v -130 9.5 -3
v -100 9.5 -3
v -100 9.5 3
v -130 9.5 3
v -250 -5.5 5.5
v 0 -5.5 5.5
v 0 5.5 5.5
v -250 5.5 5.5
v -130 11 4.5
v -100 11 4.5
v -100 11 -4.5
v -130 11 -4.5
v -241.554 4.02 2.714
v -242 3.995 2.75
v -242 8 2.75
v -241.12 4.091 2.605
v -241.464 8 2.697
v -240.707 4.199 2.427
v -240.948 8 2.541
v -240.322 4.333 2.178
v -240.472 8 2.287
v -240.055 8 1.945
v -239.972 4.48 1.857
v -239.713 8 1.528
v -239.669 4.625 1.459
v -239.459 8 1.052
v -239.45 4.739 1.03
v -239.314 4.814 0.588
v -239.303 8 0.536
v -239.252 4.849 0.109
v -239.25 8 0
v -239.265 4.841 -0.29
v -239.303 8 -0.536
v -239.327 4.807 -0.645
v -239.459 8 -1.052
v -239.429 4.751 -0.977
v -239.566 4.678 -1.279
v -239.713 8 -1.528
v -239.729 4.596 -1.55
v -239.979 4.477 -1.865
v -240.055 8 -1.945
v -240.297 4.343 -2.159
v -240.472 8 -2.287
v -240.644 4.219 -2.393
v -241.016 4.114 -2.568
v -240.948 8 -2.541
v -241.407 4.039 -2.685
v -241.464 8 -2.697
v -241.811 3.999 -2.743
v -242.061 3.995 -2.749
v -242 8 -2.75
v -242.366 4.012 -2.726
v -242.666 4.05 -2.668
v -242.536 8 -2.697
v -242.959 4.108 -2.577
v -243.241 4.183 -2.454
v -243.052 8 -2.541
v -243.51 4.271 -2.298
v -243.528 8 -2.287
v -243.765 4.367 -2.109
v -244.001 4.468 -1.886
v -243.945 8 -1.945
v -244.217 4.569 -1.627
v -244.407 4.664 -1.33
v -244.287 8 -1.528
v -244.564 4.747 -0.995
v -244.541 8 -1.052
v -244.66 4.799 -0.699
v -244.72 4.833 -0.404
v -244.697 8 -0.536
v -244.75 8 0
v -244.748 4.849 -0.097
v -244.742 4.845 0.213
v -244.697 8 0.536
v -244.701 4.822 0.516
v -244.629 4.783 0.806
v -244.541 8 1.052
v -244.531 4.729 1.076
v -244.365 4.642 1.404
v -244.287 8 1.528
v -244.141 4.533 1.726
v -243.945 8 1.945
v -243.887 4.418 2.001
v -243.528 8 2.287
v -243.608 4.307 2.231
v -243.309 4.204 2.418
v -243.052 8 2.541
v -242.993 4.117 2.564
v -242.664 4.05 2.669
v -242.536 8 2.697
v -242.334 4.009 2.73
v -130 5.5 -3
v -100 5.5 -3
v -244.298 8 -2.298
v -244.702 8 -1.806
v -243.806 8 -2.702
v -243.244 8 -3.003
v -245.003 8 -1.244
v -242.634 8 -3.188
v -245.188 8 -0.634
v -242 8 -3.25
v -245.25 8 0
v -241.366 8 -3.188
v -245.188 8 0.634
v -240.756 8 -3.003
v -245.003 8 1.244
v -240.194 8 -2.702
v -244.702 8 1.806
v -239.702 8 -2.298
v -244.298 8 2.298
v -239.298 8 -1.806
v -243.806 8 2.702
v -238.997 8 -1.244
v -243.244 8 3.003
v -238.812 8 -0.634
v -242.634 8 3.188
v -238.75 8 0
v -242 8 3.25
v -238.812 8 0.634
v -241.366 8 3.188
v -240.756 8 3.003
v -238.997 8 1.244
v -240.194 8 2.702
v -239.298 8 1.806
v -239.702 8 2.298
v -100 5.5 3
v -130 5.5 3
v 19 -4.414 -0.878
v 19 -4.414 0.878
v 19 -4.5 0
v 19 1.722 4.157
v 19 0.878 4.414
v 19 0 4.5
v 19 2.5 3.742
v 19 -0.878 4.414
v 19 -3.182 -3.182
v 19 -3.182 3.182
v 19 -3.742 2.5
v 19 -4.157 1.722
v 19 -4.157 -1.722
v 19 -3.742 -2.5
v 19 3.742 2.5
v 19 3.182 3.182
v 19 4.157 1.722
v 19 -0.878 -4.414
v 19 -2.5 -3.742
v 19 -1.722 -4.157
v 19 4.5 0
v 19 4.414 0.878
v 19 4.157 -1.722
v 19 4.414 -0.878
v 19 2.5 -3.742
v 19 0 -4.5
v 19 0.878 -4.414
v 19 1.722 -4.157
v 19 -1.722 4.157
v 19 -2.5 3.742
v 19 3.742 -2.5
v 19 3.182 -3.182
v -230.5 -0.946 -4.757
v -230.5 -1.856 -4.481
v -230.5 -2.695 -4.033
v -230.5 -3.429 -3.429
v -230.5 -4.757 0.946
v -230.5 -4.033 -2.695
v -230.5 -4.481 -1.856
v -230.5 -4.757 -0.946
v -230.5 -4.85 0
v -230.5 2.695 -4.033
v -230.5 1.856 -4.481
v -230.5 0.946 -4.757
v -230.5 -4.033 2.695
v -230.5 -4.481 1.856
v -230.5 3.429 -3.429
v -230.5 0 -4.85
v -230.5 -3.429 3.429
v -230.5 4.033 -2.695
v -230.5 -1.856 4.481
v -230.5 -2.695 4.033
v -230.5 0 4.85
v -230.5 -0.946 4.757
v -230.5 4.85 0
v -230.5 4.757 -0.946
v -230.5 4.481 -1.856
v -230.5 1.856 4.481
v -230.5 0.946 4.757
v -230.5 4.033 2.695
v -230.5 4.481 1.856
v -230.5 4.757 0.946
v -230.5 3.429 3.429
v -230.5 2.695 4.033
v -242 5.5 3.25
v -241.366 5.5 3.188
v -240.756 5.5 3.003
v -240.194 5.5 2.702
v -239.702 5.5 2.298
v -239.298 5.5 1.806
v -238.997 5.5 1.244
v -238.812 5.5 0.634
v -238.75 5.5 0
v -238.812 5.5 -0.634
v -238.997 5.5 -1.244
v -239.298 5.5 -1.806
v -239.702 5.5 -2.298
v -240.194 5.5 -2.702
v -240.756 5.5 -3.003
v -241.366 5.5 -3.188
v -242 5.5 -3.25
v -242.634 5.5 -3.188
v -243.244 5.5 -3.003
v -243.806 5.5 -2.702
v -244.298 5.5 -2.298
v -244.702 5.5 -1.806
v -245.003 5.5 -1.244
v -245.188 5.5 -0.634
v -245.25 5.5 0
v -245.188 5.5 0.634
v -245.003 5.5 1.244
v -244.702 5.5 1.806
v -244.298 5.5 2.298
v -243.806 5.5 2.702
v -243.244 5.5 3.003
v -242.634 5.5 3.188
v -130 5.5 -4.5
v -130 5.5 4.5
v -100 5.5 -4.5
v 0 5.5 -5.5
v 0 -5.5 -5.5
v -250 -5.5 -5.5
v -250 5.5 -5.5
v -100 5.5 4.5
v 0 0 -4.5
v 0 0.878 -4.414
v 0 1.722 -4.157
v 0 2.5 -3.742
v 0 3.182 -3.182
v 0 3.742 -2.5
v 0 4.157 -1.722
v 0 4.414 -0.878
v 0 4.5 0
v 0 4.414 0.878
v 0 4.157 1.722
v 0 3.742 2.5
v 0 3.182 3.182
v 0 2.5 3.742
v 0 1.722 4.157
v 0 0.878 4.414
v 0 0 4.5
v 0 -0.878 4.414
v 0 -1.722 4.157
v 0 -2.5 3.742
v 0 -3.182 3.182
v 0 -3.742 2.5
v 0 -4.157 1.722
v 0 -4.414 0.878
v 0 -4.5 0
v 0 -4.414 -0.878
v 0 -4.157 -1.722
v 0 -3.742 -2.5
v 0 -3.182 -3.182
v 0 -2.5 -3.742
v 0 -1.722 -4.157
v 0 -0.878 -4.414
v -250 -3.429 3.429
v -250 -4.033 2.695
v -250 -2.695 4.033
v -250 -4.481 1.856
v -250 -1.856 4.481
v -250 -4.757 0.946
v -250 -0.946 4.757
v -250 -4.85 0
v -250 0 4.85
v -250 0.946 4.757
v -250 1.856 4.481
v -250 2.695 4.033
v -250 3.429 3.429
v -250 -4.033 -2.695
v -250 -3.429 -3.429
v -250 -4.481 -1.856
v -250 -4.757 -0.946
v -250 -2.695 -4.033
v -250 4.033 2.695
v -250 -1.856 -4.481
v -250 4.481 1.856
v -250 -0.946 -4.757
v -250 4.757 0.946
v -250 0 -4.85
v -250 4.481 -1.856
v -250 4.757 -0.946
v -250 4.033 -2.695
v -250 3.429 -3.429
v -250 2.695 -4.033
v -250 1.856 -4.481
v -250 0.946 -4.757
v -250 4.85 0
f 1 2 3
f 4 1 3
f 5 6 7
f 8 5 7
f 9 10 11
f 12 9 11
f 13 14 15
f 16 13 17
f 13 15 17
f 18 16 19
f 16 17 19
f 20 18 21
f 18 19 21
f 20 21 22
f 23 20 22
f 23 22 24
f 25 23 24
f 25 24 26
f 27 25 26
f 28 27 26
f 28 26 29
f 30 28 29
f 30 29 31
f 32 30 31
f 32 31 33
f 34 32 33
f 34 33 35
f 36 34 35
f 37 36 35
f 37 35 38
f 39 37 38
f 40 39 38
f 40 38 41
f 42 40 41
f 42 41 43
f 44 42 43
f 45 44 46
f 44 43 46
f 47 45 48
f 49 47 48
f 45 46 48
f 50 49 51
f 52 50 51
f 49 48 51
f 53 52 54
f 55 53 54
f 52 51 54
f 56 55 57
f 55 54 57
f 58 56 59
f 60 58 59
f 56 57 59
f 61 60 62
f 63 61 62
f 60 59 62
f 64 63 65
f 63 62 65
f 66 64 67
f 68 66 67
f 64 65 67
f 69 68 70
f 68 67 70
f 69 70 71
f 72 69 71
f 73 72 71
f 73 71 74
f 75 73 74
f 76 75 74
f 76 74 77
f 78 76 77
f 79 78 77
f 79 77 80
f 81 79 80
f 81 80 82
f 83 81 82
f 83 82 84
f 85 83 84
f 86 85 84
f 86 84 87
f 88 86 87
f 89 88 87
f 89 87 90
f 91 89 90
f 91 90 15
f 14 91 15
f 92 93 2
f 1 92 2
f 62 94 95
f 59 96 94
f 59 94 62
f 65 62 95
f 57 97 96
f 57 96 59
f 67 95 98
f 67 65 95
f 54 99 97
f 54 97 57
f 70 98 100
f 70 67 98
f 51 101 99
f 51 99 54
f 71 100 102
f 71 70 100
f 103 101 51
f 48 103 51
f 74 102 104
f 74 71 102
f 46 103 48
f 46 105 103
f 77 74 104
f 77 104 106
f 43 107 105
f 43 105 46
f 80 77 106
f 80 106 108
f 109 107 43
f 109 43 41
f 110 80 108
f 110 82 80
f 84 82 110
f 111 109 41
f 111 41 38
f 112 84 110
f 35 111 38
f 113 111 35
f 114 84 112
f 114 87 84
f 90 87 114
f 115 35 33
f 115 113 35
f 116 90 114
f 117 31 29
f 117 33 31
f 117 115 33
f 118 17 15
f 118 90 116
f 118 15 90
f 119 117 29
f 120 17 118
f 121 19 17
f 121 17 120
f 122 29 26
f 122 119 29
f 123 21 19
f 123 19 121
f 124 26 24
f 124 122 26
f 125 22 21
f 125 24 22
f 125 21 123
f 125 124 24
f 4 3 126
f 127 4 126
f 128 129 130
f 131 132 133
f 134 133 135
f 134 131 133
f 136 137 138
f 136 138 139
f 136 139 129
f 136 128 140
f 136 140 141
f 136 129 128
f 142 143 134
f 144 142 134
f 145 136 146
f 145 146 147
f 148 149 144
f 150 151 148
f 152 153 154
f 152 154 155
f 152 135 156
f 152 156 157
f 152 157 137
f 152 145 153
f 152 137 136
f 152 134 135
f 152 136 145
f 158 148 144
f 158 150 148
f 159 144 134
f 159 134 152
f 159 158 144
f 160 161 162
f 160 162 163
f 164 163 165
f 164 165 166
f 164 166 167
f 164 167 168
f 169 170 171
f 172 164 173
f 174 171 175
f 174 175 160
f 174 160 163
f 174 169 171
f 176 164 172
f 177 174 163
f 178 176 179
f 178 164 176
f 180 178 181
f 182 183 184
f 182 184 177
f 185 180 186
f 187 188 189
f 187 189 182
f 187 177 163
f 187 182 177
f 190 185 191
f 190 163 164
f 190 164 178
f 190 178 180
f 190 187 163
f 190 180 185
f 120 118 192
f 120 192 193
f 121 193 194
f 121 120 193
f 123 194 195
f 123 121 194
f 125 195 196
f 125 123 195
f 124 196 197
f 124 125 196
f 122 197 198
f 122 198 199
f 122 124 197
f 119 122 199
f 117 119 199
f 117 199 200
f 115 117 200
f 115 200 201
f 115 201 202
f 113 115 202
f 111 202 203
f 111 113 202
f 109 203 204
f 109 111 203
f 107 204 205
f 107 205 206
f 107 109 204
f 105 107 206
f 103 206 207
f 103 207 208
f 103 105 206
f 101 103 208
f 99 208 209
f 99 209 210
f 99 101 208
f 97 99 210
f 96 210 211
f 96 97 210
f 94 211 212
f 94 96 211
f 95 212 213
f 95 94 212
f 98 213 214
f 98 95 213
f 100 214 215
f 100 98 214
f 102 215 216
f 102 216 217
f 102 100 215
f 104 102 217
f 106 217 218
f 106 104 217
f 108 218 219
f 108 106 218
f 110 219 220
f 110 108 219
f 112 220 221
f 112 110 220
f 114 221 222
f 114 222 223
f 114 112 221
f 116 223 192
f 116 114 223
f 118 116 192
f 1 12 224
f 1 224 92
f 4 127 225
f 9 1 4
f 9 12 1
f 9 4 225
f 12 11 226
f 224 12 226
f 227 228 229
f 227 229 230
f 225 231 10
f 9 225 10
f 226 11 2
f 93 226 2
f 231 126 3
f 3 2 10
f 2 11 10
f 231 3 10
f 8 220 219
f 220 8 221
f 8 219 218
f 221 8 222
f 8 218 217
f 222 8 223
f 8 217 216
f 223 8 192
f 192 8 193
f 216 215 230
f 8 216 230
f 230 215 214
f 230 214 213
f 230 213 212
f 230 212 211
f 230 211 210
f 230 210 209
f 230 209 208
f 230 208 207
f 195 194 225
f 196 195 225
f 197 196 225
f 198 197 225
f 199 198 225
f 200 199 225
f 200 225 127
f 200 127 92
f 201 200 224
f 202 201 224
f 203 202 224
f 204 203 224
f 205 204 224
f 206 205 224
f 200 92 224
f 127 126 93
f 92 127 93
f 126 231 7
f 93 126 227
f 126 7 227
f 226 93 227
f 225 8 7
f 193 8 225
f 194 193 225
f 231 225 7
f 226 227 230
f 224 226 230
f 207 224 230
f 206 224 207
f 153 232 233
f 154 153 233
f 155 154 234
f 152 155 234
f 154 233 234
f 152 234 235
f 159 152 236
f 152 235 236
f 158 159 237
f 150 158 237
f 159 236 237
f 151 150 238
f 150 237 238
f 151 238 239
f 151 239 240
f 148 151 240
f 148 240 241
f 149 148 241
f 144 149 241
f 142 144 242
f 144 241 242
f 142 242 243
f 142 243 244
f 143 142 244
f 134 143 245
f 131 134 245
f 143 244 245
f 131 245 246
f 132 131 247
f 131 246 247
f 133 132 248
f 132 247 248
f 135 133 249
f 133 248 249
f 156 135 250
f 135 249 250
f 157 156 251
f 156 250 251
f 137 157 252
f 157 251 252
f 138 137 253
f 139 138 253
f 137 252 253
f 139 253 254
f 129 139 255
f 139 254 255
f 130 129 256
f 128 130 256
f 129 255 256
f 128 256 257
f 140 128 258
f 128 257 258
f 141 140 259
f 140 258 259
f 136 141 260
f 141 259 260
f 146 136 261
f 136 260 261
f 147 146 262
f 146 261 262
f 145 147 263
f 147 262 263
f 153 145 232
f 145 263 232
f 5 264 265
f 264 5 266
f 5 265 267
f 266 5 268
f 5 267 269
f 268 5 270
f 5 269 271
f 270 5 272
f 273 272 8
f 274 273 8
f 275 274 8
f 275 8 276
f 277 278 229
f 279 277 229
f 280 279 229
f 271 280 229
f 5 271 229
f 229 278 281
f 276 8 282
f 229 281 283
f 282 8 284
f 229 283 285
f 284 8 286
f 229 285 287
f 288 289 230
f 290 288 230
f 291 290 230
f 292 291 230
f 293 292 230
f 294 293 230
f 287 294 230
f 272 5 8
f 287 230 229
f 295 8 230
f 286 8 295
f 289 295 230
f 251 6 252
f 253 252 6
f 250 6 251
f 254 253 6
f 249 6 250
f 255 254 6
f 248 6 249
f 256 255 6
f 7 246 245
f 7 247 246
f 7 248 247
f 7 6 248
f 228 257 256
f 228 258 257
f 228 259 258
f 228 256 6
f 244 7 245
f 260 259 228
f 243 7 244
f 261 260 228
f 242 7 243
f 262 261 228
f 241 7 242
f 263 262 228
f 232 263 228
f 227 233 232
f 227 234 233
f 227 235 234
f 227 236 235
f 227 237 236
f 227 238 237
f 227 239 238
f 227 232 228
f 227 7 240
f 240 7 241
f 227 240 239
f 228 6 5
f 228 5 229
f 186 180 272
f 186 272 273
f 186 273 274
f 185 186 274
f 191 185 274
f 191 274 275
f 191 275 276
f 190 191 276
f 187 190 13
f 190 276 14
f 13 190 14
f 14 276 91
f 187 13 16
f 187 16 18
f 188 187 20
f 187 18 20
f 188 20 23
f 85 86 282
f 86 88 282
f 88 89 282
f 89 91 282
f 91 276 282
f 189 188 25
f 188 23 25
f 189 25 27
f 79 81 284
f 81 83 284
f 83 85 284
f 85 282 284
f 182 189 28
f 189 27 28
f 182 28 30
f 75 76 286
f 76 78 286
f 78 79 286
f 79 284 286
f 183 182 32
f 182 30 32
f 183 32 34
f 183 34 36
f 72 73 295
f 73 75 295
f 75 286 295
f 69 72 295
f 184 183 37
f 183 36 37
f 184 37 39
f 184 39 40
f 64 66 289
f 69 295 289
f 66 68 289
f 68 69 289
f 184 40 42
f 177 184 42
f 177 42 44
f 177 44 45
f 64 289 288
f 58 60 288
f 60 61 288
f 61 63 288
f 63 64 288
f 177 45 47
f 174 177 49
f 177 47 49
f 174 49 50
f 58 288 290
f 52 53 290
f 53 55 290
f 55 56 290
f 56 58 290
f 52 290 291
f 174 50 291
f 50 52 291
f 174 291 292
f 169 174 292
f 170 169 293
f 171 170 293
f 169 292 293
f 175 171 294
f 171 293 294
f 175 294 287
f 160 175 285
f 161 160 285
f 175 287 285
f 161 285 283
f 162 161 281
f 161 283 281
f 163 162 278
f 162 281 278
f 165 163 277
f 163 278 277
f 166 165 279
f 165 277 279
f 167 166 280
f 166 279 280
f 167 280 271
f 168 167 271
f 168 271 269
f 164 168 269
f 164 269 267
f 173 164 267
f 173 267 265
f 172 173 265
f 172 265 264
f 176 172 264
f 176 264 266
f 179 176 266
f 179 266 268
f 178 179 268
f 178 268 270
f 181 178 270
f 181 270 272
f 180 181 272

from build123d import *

# Parameters (mm, degrees)
SKETCH1_R               = 4.5
BOSS_EXTRUDE1_DEPTH     = 19
SKETCH2_W               = 11
SKETCH2_H               = 11
BOSS_EXTRUDE2_DEPTH     = 250
SKETCH3_R               = 4.85
CUT_EXTRUDE2_DEPTH      = 19.5
BOSS_EXTRUDE3_START     = -100
BOSS_EXTRUDE3_DEPTH     = 30
CUT_EXTRUDE3_REACH      = 252.302
CUT_EXTRUDE3_END_RADIUS = 4.85
SKETCH5_R               = 2.75
BOSS_EXTRUDE4_START     = 2.5
SKETCH5_3_R             = 3.25
SKETCH5_3_R_2           = 2.75
BOSS_EXTRUDE4_DEPTH     = 2.5


with BuildPart() as part:
    # Sketch1 → Boss-Extrude1 (new body)
    with BuildSketch(Plane(origin=(0, 0, 0), x_dir=(0, 0, -1), z_dir=(1, 0, 0))):
        Circle(SKETCH1_R)
    extrude(amount=BOSS_EXTRUDE1_DEPTH)

    # Sketch2 → Boss-Extrude2 (add)
    with BuildSketch(Plane(origin=(0, 0, 0), x_dir=(0, 0, -1), z_dir=(1, 0, 0))):
        Rectangle(SKETCH2_W, SKETCH2_H)
    extrude(amount=-BOSS_EXTRUDE2_DEPTH)

    # Sketch3 → Cut-Extrude2 (cut)
    with BuildSketch(Plane.ZY.offset(250)):
        Circle(SKETCH3_R)
    extrude(amount=-CUT_EXTRUDE2_DEPTH, mode=Mode.SUBTRACT)

    # Sketch4 → Boss-Extrude3 (add)
    with BuildSketch(Plane(origin=(0, 0, 0), x_dir=(0, 0, -1), z_dir=(1, 0, 0)).offset(BOSS_EXTRUDE3_START)):
        Polygon((-4.5, 11), (4.5, 11), (4.5, 5.5), (3, 5.5), (3, 9.5), (-3, 9.5), (-3, 5.5), (-4.5, 5.5), align=None)
    extrude(amount=-BOSS_EXTRUDE3_DEPTH)

    # Cut-Extrude3: up to this cylinder (the profile starts outside it)
    cut_extrude3_end = Plane(origin=(-242, 0, 0), z_dir=(-1, 0, 0)) * Cylinder(CUT_EXTRUDE3_END_RADIUS, 515.304, mode=Mode.PRIVATE)
    # Sketch5 → Cut-Extrude3 (cut, up to the surface)
    with BuildSketch(Plane(origin=(0, 5.5, 0), x_dir=(1, 0, 0), z_dir=(0, 1, 0)), mode=Mode.PRIVATE) as cut_extrude3_sk1:
        with Locations((-242, 0)):
            Circle(SKETCH5_R)
    cut_extrude3_tool1 = extrude(cut_extrude3_sk1.sketch, amount=-CUT_EXTRUDE3_REACH, mode=Mode.PRIVATE) - cut_extrude3_end
    add(cut_extrude3_tool1.solids().sort_by_distance((-242, 5.5, 0))[0], mode=Mode.SUBTRACT)

    # Sketch5<3> → Boss-Extrude4 (add)
    with BuildSketch(Plane(origin=(0, 5.5, 0), x_dir=(1, 0, 0), z_dir=(0, 1, 0)).offset(BOSS_EXTRUDE4_START)):
        with Locations((-242, 0)):
            Circle(SKETCH5_3_R)
        with Locations((-242, 0)):
            Circle(SKETCH5_3_R_2, mode=Mode.SUBTRACT)
    extrude(amount=-BOSS_EXTRUDE4_DEPTH)


solid = part.part
